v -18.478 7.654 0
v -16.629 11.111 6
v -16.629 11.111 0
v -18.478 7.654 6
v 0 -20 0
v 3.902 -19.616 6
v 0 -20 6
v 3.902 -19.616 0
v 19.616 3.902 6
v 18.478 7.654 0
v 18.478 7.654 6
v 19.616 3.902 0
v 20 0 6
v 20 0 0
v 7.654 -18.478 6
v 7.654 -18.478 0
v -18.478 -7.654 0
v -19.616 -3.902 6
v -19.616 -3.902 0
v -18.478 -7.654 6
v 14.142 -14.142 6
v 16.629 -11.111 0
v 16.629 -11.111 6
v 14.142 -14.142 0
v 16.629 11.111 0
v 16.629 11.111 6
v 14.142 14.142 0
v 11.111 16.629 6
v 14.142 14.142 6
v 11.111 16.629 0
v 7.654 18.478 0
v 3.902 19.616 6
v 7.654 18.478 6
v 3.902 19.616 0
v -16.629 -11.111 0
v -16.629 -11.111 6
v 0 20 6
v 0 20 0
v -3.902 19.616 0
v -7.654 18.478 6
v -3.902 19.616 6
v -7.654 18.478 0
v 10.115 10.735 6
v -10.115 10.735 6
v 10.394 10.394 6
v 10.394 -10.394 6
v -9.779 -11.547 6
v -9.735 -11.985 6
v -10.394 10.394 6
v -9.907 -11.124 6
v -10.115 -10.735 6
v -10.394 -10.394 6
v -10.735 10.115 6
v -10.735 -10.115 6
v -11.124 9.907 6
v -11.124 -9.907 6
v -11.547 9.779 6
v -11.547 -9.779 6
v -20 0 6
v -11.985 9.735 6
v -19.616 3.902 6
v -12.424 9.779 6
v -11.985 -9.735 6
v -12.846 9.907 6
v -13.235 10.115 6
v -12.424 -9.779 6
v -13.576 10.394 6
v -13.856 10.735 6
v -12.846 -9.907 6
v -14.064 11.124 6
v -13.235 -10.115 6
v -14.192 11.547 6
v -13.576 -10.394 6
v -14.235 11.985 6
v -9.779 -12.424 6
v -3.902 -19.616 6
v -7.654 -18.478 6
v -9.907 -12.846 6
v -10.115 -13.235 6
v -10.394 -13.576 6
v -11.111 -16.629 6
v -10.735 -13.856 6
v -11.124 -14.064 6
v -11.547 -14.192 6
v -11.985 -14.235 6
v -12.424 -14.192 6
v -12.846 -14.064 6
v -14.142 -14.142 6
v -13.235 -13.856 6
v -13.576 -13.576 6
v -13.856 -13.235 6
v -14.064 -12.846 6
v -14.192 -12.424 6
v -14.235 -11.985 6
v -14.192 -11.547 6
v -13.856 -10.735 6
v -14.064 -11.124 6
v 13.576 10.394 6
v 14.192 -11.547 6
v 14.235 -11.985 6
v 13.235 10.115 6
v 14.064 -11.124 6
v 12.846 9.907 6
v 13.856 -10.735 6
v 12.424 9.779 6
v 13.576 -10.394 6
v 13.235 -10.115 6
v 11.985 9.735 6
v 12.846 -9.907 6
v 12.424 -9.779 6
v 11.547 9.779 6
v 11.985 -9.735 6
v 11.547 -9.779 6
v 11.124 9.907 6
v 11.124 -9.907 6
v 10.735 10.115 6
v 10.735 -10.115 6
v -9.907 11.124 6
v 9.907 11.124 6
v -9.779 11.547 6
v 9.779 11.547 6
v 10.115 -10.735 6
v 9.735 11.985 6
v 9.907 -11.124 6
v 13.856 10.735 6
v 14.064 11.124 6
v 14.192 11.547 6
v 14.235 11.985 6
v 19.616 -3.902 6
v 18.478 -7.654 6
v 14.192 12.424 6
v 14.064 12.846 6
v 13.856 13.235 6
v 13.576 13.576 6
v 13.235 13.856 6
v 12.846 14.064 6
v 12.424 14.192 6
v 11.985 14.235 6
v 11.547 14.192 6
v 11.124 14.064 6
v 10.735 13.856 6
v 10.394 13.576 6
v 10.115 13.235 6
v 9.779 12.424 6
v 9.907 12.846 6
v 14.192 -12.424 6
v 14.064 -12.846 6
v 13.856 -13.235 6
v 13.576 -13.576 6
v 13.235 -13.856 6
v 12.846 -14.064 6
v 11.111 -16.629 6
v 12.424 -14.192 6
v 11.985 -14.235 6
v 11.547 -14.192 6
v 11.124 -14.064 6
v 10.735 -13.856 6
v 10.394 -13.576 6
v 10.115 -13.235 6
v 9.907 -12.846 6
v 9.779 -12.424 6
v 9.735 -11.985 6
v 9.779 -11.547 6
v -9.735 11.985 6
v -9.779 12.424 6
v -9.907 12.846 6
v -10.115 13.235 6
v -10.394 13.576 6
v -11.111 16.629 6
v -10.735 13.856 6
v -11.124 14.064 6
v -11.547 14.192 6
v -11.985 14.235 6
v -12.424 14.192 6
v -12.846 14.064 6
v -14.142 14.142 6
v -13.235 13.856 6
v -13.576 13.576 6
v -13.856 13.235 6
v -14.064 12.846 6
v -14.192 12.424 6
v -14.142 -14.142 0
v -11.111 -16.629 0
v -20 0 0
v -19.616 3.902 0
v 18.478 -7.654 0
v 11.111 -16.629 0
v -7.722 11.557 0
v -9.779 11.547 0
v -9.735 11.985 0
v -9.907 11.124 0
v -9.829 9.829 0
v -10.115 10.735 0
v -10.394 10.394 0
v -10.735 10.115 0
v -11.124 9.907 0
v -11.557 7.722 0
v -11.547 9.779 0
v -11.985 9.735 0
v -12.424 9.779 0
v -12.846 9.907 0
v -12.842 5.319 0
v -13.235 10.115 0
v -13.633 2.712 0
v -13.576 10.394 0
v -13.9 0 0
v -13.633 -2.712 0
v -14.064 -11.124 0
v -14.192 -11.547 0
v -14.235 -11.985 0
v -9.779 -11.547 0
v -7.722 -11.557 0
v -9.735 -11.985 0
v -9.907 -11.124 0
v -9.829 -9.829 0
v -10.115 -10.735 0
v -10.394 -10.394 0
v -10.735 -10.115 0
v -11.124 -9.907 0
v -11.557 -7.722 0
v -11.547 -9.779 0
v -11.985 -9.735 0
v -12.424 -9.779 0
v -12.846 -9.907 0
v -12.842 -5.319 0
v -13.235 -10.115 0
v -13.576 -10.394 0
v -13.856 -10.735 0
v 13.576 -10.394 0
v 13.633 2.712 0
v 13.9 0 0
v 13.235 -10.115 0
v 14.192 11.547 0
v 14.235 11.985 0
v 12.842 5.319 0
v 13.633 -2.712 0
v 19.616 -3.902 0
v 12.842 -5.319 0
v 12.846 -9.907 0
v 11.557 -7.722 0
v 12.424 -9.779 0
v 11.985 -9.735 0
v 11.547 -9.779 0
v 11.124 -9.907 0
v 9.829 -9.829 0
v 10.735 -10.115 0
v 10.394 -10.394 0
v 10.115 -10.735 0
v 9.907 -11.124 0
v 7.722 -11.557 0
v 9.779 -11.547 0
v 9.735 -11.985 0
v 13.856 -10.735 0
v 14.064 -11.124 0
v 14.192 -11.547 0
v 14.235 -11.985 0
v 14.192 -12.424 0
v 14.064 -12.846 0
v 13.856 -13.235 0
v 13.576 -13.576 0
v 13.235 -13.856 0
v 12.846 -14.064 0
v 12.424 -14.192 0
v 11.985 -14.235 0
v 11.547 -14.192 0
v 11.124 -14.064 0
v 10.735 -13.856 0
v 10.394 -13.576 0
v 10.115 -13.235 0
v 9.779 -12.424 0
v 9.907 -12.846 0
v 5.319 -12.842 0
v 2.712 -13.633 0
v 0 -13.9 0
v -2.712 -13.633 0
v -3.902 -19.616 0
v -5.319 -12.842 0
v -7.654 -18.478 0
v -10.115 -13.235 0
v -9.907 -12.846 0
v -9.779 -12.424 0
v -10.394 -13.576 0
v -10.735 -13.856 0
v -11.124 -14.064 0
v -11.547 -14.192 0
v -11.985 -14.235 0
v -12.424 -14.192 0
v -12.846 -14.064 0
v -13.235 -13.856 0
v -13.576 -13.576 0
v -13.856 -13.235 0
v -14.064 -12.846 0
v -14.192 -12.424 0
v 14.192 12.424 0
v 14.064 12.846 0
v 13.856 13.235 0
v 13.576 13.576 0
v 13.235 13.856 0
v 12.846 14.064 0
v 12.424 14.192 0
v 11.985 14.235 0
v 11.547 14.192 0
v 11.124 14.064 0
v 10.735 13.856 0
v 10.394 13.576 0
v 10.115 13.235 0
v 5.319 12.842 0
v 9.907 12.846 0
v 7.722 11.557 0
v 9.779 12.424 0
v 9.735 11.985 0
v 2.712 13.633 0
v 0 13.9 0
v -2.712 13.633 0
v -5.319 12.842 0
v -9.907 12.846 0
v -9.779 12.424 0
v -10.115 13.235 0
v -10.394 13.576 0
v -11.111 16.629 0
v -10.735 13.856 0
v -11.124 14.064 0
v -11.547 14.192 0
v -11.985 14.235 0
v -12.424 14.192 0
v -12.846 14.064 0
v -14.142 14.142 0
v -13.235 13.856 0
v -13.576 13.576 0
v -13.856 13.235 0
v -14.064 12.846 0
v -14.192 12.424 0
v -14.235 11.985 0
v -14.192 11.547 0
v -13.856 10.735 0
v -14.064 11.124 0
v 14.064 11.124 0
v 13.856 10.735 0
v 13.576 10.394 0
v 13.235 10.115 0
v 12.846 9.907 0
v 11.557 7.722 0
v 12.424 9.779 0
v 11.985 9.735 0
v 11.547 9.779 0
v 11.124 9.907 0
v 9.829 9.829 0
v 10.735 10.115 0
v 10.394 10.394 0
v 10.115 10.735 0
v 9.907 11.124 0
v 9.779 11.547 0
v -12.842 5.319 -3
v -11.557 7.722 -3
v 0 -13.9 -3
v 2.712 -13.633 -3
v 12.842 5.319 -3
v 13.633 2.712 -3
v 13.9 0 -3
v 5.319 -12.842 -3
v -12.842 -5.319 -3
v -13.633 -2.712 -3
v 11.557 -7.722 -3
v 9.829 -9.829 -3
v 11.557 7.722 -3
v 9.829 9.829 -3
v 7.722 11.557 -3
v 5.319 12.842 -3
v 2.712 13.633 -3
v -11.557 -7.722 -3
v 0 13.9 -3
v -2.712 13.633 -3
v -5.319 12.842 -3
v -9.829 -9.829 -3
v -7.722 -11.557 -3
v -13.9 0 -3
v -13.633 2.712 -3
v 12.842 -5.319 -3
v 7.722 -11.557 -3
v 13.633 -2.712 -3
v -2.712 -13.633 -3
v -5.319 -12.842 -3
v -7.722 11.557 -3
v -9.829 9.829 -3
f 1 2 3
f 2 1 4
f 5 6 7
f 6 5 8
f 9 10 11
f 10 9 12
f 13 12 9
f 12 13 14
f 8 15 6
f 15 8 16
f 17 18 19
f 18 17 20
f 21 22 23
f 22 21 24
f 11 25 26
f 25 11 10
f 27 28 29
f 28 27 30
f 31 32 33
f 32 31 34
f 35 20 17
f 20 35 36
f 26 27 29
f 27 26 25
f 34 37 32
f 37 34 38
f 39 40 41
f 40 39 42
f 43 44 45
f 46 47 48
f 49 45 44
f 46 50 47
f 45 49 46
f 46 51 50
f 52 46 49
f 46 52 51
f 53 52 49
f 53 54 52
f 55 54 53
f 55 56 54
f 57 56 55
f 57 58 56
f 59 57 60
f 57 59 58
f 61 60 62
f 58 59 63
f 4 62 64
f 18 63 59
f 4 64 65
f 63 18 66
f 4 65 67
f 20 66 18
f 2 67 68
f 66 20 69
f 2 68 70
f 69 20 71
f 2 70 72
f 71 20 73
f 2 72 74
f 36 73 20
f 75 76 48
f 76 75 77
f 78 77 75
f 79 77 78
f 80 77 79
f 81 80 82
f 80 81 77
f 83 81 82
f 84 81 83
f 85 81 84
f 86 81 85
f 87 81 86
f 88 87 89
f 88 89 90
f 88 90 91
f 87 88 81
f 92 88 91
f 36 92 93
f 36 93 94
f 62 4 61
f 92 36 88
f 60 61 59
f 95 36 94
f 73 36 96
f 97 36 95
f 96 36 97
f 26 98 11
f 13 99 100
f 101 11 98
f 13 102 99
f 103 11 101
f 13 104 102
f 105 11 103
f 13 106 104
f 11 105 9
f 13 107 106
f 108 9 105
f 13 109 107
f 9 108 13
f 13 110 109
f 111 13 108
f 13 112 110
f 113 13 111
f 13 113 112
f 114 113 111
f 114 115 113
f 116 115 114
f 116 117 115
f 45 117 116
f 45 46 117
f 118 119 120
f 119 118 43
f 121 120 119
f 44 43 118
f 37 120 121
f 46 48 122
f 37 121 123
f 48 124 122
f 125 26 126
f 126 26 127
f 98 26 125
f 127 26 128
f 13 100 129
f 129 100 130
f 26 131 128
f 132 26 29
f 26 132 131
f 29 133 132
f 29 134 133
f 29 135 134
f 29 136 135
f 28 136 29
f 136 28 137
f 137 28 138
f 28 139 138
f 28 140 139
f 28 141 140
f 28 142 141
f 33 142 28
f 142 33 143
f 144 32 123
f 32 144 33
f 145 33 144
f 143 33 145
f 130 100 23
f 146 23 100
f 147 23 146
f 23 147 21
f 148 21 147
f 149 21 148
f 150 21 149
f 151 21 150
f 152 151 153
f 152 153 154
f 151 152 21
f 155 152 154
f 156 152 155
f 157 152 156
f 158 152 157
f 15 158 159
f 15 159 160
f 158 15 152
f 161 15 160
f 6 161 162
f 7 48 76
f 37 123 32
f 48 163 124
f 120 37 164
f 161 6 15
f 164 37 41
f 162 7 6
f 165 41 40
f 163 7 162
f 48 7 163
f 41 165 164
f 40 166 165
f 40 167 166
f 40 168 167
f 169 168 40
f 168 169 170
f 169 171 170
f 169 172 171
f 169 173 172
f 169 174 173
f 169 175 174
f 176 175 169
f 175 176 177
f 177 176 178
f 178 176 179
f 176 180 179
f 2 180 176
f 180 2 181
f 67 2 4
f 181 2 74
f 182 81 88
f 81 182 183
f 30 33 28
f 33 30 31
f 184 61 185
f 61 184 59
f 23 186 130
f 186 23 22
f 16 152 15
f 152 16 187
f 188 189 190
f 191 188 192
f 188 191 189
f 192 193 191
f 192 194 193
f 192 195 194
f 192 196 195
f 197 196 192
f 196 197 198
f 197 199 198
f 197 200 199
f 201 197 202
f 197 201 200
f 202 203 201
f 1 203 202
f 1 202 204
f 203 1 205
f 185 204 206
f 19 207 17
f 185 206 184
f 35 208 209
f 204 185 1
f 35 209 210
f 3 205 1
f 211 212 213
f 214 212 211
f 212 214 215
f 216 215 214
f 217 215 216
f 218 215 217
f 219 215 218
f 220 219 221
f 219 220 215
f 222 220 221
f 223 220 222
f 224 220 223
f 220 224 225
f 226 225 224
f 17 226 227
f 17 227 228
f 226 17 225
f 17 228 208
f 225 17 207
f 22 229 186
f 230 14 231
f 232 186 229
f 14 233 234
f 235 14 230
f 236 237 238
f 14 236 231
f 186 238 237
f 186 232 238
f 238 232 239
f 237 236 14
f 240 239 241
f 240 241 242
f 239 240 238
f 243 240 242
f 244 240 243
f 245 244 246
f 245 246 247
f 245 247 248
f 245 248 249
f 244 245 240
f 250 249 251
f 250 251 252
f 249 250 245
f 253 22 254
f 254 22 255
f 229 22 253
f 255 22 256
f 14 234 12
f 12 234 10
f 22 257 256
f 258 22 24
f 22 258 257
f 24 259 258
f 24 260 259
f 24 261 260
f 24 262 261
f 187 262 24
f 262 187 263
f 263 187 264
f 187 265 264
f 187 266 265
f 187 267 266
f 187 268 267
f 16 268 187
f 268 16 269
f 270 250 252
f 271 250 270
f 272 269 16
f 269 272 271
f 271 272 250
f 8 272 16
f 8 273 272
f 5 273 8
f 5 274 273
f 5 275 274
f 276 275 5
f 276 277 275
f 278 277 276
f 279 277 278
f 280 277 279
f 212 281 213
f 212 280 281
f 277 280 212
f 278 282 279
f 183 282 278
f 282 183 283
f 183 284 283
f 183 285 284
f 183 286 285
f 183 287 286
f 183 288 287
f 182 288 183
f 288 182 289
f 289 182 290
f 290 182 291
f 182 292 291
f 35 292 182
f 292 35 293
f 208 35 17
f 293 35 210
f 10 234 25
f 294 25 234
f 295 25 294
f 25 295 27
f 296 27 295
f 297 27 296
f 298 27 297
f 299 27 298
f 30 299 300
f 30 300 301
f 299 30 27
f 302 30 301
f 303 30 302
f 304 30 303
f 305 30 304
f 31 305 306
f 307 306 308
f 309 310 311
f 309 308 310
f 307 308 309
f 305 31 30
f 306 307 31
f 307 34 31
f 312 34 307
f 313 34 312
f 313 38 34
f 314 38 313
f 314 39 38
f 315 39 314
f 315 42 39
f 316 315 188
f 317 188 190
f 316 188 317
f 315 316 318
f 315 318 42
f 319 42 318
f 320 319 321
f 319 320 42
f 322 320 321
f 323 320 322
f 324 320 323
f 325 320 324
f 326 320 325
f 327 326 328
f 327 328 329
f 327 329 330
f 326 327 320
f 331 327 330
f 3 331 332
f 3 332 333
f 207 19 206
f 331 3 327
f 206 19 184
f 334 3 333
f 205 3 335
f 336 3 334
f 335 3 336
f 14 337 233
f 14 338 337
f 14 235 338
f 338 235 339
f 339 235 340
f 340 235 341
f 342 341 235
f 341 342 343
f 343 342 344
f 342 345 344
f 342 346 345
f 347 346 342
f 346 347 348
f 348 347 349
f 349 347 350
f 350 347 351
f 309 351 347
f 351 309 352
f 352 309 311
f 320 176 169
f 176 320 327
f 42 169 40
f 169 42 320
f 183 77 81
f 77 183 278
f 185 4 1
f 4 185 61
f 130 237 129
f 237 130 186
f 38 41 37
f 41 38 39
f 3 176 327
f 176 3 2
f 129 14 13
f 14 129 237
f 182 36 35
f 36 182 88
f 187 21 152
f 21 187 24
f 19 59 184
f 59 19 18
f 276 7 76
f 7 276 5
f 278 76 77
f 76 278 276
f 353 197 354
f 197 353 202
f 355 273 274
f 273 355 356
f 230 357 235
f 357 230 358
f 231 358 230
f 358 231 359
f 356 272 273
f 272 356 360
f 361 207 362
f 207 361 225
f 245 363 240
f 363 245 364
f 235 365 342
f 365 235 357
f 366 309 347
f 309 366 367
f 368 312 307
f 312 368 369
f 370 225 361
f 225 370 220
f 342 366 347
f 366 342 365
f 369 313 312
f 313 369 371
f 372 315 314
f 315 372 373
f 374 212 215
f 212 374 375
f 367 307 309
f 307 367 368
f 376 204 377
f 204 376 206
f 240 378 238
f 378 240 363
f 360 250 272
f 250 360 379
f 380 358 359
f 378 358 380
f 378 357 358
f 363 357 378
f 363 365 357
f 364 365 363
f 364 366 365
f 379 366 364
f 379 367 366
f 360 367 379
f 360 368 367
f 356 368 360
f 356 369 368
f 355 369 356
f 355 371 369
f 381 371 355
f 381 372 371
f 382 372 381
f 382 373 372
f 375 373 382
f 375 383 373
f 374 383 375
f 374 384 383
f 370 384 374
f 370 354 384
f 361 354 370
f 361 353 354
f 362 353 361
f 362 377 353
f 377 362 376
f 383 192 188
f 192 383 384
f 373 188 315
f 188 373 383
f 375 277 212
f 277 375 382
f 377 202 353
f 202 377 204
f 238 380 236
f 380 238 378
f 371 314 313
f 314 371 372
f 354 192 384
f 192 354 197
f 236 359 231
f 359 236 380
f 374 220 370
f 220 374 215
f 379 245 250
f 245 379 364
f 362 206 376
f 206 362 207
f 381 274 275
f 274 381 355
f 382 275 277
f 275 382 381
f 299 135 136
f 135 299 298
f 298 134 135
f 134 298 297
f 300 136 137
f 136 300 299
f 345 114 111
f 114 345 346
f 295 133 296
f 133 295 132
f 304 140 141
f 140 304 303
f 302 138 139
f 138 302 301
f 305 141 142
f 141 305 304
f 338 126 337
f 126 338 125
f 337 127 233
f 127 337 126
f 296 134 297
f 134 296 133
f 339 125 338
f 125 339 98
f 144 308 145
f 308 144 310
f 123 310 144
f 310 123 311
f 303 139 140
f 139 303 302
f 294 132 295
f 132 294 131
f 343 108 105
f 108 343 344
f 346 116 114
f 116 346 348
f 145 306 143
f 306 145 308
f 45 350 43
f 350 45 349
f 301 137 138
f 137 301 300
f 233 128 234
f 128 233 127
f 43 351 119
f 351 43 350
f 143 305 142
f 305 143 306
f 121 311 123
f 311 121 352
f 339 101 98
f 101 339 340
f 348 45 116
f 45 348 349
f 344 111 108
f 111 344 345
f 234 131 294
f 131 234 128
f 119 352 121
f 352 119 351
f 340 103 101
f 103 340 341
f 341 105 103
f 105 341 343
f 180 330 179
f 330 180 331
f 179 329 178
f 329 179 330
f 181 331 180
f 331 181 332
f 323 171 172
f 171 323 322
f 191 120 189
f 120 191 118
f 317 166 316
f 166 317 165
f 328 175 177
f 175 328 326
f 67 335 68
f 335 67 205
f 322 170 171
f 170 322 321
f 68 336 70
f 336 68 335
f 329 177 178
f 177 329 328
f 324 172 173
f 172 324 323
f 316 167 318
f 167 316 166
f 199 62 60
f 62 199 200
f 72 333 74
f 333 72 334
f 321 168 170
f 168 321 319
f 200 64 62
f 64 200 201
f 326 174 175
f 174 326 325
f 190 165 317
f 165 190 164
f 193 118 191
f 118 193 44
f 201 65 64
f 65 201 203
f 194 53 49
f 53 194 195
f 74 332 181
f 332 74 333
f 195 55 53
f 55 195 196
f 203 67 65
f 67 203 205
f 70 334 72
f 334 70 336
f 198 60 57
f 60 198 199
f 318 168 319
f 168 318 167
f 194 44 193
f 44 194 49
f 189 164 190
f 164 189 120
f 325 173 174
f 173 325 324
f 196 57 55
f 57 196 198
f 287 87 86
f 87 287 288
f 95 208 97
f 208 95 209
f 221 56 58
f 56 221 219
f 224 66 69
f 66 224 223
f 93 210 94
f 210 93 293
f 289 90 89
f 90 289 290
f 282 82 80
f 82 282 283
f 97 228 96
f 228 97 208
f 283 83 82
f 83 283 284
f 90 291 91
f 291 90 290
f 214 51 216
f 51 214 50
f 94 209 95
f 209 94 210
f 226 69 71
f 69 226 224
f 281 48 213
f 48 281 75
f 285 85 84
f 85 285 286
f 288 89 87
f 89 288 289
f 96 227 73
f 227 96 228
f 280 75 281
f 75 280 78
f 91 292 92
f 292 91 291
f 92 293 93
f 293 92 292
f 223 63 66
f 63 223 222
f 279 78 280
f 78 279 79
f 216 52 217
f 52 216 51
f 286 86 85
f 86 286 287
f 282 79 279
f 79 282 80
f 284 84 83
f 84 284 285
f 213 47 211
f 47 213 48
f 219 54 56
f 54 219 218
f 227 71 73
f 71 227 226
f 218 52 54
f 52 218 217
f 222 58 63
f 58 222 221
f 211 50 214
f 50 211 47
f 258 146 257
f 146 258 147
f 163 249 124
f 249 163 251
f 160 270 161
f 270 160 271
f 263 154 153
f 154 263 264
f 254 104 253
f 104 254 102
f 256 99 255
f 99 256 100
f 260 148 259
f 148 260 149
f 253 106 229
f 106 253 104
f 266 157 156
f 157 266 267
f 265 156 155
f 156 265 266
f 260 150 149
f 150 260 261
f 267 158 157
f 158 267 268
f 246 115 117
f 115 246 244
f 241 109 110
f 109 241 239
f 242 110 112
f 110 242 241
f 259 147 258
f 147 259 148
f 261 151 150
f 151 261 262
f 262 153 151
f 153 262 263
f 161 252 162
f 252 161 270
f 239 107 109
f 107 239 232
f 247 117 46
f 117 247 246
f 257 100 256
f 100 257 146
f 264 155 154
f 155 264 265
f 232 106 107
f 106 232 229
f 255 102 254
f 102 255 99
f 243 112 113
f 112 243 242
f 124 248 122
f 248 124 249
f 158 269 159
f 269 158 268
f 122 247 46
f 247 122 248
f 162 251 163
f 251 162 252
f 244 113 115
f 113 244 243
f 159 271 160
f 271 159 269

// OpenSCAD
$fn = 32;

// ----------------------------------------------------------------------
// Retaining cap: 6001 cover, 40 mm, spigot 27.8 mm
// ----------------------------------------------------------------------

// --- parameters (mm) ---
cap_d = 40;               // cover diameter
cap_t = 6;                // cover thickness
lip_d = 27.8;             // spigot that enters the housing
lip_h = 3;                // spigot height
bolt_d = 4.5;             // bolt clearance
bolt_r = 16.95;           // bolt circle radius

module cover() {
  cylinder(h = cap_t, d = cap_d);
}

module spigot() {
  /* sunk 1 mm into the cover; the spigot sets the overall height */
  translate([0, 0, -lip_h]) cylinder(h = lip_h + 1, d = lip_d);
}

difference() {
  union() {
    cover();
    spigot();
  }
  for (i = [0 : 3]) rotate([0, 0, 45 + i * 90]) translate([bolt_r, 0, -lip_h - 1])
    cylinder(h = lip_h + cap_t + 2, d = bolt_d);
}
